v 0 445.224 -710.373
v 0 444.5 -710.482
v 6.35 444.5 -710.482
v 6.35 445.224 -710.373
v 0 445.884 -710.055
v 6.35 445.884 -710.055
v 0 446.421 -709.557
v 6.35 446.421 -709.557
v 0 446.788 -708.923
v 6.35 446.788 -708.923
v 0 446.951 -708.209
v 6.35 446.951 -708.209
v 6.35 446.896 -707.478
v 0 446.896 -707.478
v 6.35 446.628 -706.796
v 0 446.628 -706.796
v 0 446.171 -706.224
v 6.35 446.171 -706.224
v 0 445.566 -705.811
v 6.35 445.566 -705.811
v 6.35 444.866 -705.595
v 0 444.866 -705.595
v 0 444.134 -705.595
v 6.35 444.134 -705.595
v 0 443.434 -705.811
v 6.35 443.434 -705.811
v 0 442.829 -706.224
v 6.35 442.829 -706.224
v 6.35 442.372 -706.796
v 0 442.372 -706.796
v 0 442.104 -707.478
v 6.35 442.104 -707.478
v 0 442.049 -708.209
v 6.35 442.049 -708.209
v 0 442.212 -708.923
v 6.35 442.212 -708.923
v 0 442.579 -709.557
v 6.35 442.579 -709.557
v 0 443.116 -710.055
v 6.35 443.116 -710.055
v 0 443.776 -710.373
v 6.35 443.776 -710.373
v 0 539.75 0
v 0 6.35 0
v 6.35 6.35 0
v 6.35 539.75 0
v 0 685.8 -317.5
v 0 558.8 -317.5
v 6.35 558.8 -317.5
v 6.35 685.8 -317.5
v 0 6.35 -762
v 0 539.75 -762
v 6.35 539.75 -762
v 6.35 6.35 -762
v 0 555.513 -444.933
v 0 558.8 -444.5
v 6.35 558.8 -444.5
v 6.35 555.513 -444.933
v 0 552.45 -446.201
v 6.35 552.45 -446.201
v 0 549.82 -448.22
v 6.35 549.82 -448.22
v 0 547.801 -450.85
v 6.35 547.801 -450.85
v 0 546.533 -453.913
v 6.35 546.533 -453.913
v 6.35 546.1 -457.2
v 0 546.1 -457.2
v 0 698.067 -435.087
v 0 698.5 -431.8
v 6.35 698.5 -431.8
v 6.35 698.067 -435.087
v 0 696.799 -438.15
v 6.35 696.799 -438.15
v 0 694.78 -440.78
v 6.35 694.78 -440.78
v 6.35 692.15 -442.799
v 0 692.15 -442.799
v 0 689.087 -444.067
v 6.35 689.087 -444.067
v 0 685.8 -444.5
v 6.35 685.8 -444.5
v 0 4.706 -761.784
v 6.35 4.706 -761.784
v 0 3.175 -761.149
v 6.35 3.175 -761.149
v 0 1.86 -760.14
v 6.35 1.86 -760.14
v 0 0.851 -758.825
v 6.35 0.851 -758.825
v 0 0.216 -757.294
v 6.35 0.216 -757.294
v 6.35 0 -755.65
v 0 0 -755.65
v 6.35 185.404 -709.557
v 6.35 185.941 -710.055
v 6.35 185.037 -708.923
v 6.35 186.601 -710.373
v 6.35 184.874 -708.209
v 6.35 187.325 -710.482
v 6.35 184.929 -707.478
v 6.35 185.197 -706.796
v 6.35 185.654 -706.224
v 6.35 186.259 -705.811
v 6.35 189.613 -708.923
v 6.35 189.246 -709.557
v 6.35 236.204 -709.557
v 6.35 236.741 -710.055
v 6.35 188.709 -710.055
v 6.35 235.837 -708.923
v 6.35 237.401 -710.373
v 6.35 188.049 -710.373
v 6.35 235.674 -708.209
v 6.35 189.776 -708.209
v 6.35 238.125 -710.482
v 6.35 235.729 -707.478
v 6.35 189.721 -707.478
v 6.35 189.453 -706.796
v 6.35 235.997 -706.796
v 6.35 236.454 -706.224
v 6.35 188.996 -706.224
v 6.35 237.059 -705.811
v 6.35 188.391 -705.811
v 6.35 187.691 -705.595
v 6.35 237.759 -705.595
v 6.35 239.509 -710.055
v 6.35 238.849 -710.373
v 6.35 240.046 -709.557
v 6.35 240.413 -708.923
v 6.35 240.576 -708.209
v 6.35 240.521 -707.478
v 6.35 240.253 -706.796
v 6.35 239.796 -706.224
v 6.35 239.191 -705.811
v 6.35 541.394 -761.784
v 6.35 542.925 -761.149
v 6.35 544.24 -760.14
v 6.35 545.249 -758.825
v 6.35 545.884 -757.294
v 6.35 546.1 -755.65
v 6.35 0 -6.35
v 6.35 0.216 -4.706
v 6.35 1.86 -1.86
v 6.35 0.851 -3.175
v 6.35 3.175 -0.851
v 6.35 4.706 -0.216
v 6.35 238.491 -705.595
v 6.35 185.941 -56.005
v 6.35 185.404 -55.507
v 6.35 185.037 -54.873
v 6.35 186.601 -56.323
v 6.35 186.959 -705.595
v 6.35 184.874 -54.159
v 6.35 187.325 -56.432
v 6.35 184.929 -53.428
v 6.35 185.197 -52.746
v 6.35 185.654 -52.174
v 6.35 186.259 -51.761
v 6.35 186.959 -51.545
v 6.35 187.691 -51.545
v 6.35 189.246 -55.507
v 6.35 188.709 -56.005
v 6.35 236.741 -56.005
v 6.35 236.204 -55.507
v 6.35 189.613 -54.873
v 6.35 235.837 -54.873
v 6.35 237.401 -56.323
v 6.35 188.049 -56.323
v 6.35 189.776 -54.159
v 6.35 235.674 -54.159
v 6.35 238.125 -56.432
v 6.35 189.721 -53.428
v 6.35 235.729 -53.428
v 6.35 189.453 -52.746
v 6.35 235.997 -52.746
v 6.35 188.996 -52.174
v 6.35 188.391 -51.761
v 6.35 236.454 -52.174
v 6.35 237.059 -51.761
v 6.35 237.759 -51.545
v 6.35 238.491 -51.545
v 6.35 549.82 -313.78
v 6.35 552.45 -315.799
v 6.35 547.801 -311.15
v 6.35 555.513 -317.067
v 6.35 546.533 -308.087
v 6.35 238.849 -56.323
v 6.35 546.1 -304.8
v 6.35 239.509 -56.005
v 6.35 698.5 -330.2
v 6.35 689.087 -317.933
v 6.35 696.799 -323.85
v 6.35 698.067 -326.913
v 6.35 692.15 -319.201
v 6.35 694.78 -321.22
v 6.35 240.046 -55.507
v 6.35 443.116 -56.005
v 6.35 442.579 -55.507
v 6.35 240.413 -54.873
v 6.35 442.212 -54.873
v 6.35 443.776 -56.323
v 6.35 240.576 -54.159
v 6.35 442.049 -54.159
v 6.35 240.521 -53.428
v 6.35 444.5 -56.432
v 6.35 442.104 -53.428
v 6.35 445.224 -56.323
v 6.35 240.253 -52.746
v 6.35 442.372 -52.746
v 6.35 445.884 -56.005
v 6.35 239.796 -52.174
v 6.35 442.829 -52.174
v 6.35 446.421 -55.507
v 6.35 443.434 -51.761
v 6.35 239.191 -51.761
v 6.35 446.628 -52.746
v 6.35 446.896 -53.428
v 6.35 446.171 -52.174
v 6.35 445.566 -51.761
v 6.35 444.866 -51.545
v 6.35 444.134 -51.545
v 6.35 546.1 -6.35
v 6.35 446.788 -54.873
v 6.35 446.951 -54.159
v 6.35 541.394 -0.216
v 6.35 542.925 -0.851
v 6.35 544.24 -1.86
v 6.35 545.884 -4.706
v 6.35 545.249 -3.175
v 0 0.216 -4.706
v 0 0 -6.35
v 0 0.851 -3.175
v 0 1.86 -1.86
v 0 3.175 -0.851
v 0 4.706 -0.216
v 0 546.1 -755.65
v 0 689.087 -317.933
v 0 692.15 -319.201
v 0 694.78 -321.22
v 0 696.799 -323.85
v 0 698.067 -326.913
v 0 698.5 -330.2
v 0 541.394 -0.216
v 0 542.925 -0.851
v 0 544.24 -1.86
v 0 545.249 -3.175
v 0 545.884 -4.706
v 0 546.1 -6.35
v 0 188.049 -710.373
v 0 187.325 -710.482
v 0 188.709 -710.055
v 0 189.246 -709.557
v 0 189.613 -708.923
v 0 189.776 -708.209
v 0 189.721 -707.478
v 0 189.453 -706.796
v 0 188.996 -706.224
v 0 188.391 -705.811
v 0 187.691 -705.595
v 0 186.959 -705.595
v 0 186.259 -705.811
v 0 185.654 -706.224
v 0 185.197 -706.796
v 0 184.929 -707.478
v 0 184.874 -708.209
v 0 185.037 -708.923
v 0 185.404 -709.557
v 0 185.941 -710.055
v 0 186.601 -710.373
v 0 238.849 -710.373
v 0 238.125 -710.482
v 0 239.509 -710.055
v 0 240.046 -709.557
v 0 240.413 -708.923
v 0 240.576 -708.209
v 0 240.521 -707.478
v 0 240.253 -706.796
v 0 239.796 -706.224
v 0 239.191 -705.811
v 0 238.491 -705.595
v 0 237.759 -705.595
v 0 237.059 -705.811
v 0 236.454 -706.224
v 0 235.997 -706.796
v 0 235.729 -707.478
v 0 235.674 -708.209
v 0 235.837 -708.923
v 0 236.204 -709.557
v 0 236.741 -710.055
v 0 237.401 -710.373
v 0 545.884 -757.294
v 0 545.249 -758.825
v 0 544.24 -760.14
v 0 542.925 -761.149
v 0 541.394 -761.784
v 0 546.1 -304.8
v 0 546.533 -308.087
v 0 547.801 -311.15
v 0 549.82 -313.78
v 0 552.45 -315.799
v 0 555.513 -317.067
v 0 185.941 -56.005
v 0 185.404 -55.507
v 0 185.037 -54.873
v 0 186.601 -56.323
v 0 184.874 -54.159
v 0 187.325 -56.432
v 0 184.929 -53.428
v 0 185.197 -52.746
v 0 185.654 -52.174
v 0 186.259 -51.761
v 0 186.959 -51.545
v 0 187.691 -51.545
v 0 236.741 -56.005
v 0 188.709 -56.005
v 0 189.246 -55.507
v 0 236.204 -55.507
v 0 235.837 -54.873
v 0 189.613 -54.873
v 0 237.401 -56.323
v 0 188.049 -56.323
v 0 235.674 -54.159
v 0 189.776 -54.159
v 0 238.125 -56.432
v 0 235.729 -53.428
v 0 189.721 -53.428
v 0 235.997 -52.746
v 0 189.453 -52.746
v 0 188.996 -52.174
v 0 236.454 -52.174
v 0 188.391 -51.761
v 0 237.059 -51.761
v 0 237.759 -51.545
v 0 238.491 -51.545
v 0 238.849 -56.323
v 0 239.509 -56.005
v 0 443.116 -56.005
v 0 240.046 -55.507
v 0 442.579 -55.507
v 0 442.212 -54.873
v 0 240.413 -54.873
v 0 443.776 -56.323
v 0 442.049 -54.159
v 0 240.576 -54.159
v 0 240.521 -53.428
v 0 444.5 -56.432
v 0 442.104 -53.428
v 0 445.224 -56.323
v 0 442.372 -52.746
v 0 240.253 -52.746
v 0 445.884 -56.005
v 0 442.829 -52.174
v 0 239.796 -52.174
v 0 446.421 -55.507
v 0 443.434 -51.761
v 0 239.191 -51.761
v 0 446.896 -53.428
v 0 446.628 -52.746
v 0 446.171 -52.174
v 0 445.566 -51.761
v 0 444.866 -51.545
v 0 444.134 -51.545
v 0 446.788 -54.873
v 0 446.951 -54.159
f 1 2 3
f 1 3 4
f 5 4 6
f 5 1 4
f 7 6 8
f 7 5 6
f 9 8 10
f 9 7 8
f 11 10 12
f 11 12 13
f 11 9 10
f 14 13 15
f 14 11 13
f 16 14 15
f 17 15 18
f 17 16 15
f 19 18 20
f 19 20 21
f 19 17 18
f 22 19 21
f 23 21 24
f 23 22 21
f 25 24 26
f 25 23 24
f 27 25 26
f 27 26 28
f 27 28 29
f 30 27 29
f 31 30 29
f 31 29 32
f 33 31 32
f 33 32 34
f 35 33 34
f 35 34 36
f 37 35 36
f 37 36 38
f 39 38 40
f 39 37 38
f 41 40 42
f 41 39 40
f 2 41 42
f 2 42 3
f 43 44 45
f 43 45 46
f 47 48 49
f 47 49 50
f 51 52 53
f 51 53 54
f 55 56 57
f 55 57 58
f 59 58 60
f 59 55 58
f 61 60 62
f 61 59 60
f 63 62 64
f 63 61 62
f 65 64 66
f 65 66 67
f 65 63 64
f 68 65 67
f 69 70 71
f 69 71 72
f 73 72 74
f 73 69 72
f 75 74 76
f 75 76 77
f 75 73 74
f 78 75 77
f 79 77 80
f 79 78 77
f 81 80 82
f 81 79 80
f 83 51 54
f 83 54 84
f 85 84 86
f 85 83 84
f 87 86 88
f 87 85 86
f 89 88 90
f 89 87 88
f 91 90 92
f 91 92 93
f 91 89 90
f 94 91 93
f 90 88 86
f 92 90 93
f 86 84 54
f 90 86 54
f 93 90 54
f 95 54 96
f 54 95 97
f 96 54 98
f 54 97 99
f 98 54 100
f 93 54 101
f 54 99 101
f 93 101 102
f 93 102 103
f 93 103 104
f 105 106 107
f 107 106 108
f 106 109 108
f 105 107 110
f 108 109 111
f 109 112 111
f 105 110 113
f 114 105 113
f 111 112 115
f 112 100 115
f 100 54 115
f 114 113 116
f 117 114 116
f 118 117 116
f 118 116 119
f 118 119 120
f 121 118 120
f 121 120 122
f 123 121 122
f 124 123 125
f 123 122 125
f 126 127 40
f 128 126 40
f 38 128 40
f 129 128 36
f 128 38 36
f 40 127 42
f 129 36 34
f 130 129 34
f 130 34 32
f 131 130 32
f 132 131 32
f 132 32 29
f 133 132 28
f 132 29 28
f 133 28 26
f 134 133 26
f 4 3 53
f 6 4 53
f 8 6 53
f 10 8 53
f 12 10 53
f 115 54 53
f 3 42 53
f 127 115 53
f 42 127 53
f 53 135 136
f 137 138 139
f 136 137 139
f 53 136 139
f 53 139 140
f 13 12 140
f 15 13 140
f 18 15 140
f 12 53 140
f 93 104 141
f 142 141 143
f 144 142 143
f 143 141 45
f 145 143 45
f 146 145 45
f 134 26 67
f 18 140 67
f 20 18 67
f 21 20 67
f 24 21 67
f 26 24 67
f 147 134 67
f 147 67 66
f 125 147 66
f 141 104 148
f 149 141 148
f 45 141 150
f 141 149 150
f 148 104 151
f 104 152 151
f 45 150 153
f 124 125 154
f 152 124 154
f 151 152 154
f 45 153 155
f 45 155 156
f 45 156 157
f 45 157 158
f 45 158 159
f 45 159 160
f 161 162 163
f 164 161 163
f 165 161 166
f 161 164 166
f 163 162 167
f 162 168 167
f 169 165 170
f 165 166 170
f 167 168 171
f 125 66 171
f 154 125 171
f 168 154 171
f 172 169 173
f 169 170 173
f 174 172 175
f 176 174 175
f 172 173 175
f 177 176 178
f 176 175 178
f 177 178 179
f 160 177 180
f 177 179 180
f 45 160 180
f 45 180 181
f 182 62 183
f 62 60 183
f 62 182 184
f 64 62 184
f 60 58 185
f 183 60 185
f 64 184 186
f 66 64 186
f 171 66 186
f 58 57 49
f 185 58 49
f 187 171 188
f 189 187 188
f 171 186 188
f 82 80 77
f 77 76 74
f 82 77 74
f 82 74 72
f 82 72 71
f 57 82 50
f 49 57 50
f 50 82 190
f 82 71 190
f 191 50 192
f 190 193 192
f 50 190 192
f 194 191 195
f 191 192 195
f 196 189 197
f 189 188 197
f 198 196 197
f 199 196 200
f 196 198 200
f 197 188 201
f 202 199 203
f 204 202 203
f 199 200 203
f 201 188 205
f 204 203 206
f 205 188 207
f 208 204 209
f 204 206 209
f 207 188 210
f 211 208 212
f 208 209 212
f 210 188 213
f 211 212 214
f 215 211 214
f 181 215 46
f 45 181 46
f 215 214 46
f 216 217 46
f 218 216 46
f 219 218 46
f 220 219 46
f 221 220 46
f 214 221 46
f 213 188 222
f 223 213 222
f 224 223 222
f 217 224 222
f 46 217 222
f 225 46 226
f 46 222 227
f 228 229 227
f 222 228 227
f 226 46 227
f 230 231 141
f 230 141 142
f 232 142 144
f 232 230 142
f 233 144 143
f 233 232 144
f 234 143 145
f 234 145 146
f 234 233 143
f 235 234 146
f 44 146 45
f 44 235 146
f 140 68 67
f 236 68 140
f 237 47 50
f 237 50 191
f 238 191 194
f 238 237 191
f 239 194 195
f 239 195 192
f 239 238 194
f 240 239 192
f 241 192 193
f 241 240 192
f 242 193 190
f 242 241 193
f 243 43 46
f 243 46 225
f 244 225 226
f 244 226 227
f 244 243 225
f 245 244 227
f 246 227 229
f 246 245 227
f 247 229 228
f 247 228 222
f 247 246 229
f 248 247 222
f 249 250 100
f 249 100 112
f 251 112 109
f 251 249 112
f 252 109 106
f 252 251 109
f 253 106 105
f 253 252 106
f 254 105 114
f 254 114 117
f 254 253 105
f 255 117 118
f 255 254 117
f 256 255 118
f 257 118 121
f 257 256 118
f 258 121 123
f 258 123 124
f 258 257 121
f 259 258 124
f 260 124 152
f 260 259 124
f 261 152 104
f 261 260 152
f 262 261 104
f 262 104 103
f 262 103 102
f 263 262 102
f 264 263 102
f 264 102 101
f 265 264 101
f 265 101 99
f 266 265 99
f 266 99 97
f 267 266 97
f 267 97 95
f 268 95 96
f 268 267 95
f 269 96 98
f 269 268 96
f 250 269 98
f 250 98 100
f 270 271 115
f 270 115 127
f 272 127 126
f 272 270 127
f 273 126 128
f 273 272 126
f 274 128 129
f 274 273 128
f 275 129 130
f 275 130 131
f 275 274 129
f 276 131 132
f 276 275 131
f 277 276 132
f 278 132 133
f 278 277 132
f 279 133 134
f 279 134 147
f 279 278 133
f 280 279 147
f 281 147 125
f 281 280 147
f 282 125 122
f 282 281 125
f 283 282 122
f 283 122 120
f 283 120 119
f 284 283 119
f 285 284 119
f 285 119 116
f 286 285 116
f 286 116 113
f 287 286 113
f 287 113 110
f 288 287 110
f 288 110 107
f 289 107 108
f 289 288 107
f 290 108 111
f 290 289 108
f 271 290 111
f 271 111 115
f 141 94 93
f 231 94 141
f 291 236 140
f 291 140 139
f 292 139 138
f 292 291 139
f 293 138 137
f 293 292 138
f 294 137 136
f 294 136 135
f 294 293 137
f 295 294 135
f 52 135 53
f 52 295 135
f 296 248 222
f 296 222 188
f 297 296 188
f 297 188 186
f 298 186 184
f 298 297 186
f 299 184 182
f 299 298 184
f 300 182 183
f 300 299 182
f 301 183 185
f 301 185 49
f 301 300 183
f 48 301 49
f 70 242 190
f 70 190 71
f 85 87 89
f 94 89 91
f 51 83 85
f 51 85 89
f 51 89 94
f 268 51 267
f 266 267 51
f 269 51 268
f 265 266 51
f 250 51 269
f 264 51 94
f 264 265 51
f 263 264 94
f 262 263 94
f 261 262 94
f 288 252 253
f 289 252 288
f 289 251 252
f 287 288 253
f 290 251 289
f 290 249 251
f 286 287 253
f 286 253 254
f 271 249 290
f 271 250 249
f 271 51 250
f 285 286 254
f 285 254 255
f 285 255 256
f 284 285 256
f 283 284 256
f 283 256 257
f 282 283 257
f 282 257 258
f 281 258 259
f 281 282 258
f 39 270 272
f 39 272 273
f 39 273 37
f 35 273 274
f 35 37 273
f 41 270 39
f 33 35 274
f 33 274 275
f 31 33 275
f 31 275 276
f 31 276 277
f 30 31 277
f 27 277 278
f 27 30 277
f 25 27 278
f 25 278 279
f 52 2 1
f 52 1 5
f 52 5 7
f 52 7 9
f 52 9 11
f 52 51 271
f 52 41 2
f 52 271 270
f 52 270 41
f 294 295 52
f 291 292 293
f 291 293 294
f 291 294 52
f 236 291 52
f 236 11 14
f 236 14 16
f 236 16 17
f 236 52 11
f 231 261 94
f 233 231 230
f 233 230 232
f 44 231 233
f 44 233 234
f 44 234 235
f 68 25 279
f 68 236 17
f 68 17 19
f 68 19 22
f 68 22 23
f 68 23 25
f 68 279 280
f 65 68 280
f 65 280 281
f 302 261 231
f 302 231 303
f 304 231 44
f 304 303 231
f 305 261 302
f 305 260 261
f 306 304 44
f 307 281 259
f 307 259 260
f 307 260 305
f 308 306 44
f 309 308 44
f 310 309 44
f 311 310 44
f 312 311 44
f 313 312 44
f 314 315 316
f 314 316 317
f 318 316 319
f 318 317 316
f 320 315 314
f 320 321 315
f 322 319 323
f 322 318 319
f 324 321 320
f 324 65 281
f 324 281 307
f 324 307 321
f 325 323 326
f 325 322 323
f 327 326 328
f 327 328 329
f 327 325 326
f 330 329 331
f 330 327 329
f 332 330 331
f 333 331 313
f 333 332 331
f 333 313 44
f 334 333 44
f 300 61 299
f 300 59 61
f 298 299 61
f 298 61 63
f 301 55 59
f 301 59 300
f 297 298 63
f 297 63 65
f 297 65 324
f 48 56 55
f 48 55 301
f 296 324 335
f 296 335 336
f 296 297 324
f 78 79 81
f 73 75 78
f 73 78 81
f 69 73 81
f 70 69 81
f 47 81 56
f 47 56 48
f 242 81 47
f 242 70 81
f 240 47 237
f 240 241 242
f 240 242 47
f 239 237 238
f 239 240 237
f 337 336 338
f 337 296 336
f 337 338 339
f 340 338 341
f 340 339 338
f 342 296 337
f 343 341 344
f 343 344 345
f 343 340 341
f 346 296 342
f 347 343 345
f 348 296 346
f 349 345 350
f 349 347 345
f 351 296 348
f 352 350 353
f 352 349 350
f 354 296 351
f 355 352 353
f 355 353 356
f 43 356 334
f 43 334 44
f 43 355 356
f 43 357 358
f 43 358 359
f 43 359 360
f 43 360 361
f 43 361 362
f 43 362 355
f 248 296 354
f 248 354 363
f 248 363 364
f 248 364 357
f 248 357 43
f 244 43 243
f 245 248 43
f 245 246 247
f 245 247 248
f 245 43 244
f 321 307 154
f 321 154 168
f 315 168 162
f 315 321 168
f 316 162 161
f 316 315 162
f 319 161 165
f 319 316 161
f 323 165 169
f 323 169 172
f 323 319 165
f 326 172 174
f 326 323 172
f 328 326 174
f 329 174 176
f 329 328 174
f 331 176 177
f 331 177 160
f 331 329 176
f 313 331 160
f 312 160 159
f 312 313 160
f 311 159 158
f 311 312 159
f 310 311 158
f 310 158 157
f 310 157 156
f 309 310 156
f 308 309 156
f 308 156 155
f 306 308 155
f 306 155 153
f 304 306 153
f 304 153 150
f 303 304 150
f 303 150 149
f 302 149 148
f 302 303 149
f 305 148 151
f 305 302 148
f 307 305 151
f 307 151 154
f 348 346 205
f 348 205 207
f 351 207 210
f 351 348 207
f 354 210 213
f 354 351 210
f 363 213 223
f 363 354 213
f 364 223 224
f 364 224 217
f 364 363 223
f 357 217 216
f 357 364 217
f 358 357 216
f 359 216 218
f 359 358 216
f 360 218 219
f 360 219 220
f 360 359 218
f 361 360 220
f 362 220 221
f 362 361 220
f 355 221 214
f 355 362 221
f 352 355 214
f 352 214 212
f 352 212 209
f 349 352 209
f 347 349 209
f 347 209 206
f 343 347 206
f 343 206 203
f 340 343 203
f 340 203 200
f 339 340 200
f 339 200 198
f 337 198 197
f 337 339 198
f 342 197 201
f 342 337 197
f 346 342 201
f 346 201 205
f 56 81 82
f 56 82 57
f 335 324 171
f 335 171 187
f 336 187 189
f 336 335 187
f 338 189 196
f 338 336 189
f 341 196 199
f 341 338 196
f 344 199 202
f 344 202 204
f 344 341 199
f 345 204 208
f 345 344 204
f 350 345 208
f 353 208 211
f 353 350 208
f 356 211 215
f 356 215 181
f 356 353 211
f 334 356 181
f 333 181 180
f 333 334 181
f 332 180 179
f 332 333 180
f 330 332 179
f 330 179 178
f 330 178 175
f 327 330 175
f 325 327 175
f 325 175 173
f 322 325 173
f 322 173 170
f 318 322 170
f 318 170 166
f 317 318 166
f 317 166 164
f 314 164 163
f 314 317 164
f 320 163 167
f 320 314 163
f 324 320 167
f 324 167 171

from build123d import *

# Parameters (mm, degrees)
SKETCH1_R           = 2.45745
BOSS_EXTRUDE1_DEPTH = 6.35


with BuildPart() as part:
    # Sketch1 → Boss-Extrude1 (new body)
    with BuildSketch(Plane(origin=(0, 0, 0), x_dir=(0, 0, -1), z_dir=(1, 0, 0))):
        with BuildLine():
            Line((457.2, 546.1), (755.65, 546.1))
            ThreePointArc((755.65, 546.1), (760.140128061, 544.240128061), (762, 539.75))
            Line((762, 539.75), (762, 6.35))
            ThreePointArc((762, 6.35), (760.140128061, 1.859871939), (755.65, 0))
            Line((755.65, 0), (6.35, 0))
            ThreePointArc((6.35, 0), (1.859871939, 1.859871939), (0, 6.35))
            Line((0, 6.35), (0, 539.75))
            ThreePointArc((0, 539.75), (1.859871939, 544.240128061), (6.35, 546.1))
            Line((6.35, 546.1), (304.8, 546.1))
            ThreePointArc((304.8, 546.1), (313.780256121, 549.819743879), (317.5, 558.8))
            Line((317.5, 558.8), (317.5, 685.8))
            ThreePointArc((317.5, 685.8), (321.219743879, 694.780256121), (330.2, 698.5))
            Line((330.2, 698.5), (431.8, 698.5))
            ThreePointArc((431.8, 698.5), (440.780256121, 694.780256121), (444.5, 685.8))
            Line((444.5, 685.8), (444.5, 558.8))
            ThreePointArc((444.5, 558.8), (448.219743879, 549.819743879), (457.2, 546.1))
        make_face()
        with Locations((53.975, 444.5)):
            Circle(SKETCH1_R, mode=Mode.SUBTRACT)
        with Locations((708.025, 444.5)):
            Circle(SKETCH1_R, mode=Mode.SUBTRACT)
        with Locations((708.025, 238.125)):
            Circle(SKETCH1_R, mode=Mode.SUBTRACT)
        with Locations((53.975, 238.125)):
            Circle(SKETCH1_R, mode=Mode.SUBTRACT)
        with Locations((53.975, 187.325)):
            Circle(SKETCH1_R, mode=Mode.SUBTRACT)
        with Locations((708.025, 187.325)):
            Circle(SKETCH1_R, mode=Mode.SUBTRACT)
    extrude(amount=BOSS_EXTRUDE1_DEPTH)


solid = part.part
